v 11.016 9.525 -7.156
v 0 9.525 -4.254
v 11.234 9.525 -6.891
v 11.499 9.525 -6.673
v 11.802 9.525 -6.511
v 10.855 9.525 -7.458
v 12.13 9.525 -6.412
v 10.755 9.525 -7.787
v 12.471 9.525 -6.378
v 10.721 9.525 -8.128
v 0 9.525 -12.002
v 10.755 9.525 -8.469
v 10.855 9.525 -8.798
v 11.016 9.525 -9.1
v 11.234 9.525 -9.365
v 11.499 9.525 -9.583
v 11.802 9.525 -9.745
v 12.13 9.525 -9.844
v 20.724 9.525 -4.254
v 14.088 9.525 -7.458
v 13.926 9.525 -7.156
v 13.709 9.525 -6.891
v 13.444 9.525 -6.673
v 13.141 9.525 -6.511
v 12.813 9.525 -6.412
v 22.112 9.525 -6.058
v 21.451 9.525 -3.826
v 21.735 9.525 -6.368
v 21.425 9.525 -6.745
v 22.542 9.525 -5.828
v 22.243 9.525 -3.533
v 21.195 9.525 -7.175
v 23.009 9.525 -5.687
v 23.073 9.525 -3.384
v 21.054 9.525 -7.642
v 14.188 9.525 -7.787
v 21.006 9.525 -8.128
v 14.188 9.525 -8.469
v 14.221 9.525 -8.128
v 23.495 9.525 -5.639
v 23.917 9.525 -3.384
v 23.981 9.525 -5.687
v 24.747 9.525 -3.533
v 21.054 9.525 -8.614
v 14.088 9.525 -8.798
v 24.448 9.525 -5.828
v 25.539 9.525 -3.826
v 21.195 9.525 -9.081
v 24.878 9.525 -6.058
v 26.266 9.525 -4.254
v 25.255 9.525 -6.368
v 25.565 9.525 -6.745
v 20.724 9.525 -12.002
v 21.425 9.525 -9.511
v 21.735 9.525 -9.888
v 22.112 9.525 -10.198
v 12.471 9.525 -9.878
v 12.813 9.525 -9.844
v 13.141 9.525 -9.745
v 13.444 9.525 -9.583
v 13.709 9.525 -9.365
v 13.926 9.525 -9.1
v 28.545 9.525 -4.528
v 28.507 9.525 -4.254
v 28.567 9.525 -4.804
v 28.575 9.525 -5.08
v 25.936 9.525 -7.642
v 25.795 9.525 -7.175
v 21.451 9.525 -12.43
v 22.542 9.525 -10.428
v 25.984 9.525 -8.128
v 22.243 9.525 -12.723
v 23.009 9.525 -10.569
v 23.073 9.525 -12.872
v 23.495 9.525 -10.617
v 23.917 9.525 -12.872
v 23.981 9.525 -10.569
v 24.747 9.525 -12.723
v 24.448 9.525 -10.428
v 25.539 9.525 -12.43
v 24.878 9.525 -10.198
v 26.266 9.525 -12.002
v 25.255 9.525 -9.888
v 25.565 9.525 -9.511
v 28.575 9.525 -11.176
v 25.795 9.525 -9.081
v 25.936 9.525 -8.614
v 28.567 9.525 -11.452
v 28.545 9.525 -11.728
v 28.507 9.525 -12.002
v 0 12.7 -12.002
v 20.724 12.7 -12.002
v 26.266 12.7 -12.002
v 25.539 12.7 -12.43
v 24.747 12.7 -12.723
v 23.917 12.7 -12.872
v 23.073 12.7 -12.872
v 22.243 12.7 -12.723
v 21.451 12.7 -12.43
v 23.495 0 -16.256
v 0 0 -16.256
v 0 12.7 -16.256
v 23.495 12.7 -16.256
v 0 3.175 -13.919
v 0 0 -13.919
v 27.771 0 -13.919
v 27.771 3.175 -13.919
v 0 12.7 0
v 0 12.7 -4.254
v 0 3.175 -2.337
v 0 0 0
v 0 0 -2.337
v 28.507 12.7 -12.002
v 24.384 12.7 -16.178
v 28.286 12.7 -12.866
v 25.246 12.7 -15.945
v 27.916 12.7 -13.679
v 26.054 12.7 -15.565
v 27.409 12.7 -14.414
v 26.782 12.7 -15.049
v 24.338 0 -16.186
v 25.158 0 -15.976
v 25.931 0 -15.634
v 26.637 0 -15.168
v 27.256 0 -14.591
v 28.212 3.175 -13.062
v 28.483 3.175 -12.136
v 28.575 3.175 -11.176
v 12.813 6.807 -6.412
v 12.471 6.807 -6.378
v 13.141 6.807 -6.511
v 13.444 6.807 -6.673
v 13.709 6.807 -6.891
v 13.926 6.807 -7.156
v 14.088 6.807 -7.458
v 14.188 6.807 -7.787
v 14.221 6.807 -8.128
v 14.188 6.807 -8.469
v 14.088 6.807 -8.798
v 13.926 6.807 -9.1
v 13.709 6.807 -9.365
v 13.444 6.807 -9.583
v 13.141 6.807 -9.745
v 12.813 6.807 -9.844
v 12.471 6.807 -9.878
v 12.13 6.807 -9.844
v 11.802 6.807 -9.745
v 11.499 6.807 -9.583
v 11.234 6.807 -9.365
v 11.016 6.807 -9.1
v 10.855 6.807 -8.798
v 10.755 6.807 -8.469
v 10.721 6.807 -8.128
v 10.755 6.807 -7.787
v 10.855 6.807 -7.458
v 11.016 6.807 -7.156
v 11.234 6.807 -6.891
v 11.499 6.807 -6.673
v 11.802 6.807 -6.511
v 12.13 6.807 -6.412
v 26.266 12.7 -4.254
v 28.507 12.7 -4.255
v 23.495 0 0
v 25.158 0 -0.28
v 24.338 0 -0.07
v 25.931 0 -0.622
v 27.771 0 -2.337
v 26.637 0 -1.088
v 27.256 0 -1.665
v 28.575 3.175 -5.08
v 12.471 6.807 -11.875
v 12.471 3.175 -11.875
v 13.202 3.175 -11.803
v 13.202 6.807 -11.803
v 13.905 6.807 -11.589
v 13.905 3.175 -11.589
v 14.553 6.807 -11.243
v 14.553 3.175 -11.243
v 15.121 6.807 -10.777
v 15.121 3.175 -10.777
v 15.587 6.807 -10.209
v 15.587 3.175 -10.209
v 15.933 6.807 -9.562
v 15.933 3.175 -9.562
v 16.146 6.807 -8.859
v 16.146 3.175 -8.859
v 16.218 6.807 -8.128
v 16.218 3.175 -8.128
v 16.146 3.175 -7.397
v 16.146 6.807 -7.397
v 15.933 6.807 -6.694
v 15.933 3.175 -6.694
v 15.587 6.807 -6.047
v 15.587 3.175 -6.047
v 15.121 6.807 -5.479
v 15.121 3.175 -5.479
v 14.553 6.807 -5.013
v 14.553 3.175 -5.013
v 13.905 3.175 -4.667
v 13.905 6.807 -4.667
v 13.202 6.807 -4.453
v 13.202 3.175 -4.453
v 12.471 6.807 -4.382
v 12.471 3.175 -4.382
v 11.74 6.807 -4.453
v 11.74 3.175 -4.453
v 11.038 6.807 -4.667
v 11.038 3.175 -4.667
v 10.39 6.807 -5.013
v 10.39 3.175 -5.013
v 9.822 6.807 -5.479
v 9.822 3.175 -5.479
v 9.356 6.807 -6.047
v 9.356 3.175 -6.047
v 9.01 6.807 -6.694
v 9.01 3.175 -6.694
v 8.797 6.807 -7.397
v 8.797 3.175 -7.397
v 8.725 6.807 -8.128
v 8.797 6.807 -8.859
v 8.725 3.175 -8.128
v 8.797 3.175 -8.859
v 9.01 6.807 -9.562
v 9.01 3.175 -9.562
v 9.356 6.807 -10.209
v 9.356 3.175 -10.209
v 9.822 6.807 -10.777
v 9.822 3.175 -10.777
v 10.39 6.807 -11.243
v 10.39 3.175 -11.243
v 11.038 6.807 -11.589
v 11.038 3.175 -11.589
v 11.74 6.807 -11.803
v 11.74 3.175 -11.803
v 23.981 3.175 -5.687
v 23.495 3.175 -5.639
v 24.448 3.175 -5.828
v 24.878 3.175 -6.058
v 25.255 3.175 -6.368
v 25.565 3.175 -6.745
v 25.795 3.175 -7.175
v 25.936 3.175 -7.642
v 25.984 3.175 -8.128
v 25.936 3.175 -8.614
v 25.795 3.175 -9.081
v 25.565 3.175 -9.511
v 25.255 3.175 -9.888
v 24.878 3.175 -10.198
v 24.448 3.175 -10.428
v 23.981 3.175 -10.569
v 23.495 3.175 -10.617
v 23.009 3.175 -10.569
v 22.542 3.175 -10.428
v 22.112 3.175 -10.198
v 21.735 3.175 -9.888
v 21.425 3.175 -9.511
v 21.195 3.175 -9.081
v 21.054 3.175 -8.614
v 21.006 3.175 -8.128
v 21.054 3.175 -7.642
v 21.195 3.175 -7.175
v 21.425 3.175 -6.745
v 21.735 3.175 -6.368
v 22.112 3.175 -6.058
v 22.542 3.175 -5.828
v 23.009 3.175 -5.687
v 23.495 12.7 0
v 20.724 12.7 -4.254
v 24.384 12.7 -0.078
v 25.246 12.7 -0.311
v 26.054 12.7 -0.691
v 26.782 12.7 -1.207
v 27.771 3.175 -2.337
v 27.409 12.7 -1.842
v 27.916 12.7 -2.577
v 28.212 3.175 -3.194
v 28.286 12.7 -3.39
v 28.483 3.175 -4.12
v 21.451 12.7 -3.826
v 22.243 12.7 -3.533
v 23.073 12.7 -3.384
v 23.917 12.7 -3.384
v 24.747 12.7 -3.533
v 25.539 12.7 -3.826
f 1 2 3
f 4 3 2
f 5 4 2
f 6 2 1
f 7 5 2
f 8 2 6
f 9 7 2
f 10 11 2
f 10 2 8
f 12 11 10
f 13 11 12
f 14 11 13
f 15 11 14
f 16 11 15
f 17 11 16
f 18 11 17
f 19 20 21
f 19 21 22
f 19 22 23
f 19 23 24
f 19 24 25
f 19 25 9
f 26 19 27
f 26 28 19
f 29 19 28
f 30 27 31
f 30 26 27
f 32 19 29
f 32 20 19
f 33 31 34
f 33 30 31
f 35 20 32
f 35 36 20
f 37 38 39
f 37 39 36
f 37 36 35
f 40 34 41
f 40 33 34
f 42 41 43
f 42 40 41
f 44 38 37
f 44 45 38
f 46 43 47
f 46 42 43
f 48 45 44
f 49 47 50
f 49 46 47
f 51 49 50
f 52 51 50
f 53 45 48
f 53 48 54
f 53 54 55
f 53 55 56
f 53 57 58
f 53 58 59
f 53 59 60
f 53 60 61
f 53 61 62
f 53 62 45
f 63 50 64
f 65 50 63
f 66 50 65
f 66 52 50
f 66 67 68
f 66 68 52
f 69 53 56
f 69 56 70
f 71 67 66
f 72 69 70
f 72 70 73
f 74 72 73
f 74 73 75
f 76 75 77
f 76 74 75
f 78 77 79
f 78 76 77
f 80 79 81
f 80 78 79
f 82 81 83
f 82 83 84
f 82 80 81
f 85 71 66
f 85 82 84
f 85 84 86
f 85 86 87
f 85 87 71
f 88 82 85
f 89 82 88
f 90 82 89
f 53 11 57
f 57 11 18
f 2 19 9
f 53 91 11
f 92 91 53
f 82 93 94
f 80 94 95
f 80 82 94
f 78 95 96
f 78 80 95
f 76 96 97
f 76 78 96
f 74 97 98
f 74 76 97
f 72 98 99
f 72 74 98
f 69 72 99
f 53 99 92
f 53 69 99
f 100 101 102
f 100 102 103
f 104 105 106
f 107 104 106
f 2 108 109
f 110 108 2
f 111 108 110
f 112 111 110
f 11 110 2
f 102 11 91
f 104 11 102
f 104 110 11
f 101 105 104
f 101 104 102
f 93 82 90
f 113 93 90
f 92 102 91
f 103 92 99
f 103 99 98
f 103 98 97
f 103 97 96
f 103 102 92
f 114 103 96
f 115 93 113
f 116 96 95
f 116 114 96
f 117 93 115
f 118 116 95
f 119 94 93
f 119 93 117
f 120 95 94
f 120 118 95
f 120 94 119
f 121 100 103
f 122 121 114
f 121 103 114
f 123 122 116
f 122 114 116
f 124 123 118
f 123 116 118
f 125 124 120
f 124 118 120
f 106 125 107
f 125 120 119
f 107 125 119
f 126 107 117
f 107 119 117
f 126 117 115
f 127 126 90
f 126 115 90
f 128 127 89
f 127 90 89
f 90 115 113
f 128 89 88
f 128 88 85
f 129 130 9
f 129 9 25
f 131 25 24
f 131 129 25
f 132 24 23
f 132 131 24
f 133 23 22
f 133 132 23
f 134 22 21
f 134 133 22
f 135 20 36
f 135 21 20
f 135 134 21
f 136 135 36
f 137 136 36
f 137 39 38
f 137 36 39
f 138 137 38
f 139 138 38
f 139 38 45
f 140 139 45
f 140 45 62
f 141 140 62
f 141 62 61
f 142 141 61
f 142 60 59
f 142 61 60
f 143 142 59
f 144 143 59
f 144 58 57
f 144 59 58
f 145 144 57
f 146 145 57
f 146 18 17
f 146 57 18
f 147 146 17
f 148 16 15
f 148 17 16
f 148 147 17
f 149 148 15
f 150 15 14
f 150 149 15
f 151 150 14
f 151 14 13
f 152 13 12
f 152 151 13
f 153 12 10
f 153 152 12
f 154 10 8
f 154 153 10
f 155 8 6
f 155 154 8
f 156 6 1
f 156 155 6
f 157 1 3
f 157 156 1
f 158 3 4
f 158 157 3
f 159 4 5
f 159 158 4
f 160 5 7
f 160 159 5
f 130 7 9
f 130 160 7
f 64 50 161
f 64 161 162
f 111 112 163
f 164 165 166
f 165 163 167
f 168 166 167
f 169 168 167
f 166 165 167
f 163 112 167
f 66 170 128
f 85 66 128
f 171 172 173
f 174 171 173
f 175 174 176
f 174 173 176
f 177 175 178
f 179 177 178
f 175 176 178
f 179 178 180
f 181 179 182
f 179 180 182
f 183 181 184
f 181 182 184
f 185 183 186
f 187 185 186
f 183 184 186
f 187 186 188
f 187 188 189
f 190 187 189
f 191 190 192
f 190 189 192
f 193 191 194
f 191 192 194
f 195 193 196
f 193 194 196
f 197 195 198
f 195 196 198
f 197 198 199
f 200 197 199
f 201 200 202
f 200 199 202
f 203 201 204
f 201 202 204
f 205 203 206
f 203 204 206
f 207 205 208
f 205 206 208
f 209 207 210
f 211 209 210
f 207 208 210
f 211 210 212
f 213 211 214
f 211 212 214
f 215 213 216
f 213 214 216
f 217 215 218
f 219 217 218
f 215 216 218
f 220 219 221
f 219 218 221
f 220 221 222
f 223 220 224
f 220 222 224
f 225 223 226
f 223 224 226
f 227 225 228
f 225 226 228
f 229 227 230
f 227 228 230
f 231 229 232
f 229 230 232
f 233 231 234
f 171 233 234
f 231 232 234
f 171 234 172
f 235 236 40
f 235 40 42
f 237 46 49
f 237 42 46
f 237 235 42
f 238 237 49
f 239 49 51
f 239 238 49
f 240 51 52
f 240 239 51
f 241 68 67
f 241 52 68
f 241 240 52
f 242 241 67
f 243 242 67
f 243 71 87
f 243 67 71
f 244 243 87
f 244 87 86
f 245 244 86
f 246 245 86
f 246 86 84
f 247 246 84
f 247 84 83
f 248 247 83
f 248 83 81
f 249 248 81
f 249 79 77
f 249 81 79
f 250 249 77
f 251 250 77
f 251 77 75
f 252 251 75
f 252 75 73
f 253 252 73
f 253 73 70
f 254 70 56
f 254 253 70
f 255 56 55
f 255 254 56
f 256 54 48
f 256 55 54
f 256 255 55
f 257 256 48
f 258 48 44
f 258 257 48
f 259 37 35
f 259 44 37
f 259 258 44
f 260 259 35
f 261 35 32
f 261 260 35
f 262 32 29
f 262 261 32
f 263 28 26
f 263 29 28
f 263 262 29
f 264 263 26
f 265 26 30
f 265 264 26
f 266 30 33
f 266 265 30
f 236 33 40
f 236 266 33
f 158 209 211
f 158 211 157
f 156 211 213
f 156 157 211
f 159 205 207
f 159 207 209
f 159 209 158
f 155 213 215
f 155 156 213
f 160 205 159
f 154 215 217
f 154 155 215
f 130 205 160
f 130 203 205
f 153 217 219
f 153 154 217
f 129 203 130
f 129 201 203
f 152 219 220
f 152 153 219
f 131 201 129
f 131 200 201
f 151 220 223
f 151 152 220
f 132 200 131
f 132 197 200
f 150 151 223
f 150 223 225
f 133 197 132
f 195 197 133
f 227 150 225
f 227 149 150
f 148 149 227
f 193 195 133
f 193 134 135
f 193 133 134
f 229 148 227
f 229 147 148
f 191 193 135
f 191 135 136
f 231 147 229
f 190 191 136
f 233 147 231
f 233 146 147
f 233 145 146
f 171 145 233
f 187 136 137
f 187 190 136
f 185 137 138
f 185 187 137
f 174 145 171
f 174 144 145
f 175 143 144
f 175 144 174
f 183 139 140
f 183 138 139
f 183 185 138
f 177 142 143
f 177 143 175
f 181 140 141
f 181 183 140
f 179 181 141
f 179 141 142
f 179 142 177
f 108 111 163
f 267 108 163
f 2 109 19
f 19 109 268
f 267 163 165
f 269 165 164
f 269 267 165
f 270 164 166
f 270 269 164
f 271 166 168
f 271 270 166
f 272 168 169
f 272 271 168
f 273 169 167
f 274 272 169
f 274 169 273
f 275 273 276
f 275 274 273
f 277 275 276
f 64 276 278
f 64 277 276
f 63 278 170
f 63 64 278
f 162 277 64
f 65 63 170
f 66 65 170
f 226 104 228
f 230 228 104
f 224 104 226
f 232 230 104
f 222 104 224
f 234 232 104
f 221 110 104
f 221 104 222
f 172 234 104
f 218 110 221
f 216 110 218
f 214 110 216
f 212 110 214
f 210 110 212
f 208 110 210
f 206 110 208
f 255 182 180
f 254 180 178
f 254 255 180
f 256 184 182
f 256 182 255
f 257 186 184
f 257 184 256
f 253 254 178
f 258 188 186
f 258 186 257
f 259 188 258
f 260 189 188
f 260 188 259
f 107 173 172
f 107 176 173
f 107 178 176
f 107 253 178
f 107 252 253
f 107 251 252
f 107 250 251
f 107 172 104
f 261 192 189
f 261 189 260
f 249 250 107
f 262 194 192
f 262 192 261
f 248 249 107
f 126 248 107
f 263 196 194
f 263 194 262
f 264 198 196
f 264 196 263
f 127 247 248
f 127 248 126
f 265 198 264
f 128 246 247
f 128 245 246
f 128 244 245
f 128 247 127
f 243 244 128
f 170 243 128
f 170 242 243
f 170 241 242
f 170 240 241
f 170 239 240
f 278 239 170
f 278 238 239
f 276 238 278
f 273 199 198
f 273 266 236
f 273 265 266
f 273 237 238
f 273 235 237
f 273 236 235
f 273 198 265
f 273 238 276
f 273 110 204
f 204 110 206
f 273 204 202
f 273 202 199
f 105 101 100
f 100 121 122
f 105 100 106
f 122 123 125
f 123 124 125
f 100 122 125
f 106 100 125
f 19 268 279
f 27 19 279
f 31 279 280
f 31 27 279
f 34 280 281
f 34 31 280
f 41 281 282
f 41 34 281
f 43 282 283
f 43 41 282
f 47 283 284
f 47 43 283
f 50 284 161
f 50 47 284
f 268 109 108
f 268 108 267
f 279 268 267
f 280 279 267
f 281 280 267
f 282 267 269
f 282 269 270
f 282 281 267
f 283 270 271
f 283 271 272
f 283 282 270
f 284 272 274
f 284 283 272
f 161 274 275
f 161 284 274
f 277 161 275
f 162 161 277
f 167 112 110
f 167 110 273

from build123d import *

# Parameters (mm, degrees)
SKETCH1_W           = 28.575
SKETCH1_H           = 16.256
SKETCH1_R           = 2.4892
SKETCH1_R_2         = 1.75
BOSS_EXTRUDE1_DEPTH = 12.7
SKETCH2_W           = 36.398054667
SKETCH2_H           = 7.747
CUT_EXTRUDE1_DEPTH  = 3.175
SKETCH3_W           = 33.032622038
SKETCH3_H           = 11.5824
CUT_EXTRUDE2_DEPTH  = 3.175
SKETCH4_R           = 3.7465
CUT_EXTRUDE3_DEPTH  = 3.6322
FILLET1_R           = 5.08
SKETCH5_R           = 4.7625
CUT_EXTRUDE4_DEPTH  = 35.227383569


with BuildPart() as part:
    # Sketch1 → Boss-Extrude1 (new body)
    with BuildSketch(Plane(origin=(0, 0, 0), x_dir=(1, 0, 0), z_dir=(0, 1, 0))):
        with Locations((14.2875, 8.128)):
            Rectangle(SKETCH1_W, SKETCH1_H)
        with Locations(Location((23.495, 8.128, 0), (0, 0, 270))):
            Circle(SKETCH1_R, mode=Mode.SUBTRACT)
        with Locations(Location((12.4714, 8.128, 0), (0, 0, 270))):
            Circle(SKETCH1_R_2, mode=Mode.SUBTRACT)
    extrude(amount=BOSS_EXTRUDE1_DEPTH)

    # Sketch2 → Cut-Extrude1 (cut)
    with BuildSketch(Plane(origin=(0, 12.7, 0), x_dir=(1, 0, 0), z_dir=(0, 1, 0))):
        with Locations((15.783080999, 8.128)):
            Rectangle(SKETCH2_W, SKETCH2_H)
    extrude(amount=-CUT_EXTRUDE1_DEPTH, mode=Mode.SUBTRACT)

    # Sketch3 → Cut-Extrude2 (cut)
    with BuildSketch(Plane.XZ):
        with Locations((15.449592918, -8.128)):
            Rectangle(SKETCH3_W, SKETCH3_H)
    extrude(amount=-CUT_EXTRUDE2_DEPTH, mode=Mode.SUBTRACT)

    # Sketch4 → Cut-Extrude3 (cut)
    with BuildSketch(Plane.XZ.offset(-3.175)):
        with Locations(Location((12.4714, -8.128, 0), (0, 0, 270))):
            Circle(SKETCH4_R)
    extrude(amount=-CUT_EXTRUDE3_DEPTH, mode=Mode.SUBTRACT)

    # Fillet1
    fillet1_edges = [part.edges().sort_by_distance(p)[0] for p in [
        (28.575, 6.35, -16.256),
        (28.575, 6.35, 0),
    ]]
    fillet(fillet1_edges, radius=FILLET1_R)

    # Sketch5 → Cut-Extrude4 (cut, through all)
    with BuildSketch(Plane(origin=(0, 9.525, 0), x_dir=(1, 0, 0), z_dir=(0, 1, 0))):
        with Locations((23.495, 8.128)):
            Circle(SKETCH5_R)
    extrude(amount=CUT_EXTRUDE4_DEPTH, mode=Mode.SUBTRACT)


solid = part.part
